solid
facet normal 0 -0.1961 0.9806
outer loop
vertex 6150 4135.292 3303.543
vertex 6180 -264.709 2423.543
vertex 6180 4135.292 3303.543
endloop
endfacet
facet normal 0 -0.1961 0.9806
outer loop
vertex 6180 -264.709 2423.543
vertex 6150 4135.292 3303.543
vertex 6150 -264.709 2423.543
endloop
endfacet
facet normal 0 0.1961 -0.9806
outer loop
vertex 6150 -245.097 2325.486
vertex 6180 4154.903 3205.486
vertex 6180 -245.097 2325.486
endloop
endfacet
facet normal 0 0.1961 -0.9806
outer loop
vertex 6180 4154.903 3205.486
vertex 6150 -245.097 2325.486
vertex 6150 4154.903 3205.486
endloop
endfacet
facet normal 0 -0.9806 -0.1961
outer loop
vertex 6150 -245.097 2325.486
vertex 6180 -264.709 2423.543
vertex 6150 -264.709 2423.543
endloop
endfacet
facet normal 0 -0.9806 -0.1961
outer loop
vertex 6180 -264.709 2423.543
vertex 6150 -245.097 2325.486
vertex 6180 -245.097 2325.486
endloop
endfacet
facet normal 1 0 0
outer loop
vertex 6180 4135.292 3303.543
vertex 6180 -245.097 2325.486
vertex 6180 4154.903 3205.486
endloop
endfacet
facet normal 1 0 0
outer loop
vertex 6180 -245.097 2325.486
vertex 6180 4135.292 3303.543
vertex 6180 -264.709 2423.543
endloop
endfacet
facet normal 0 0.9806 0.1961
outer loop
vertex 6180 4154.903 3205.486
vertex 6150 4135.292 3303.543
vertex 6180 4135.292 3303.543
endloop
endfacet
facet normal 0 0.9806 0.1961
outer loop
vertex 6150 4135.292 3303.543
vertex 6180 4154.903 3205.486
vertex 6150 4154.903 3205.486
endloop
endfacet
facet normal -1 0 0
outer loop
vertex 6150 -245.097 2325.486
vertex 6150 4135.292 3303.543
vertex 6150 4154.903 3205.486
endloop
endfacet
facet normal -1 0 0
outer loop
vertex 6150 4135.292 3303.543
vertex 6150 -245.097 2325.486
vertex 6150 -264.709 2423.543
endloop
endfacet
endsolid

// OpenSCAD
// file: tea_shop_roof_parameters.scad
// =============================================================================
// Tea Shop — GROUP 2: ROOF PARAMETERS
// -----------------------------------------------------------------------------
// OpenSCAD native unit: 1 mm (1000 mm = 1.0 m). Real-life scale.
// Reuses Group 1 (Base & Shell) dimensions and shared global coordinate system:
//   +X -> left -> right  (building width along X, left wall at X = 0)
//   +Y -> front -> back  (building depth along Y, front eave at Y = 0)
//   +Z -> up             (ground / plinth datum = Z = 0)
// =============================================================================

// --- SHARED GLOBAL VARIABLES FROM GROUP 1 (identical values) -----------------
WALL_T             = 250;   // wall panel thickness                      (0.25 m)
BUILD_W            = 6000;  // building width along X, left -> right      (6.00 m)
BUILD_D            = 4000;  // building depth along Y, front eave -> back (4.00 m)
BACK_H             = 3200;  // full wall height at the BACK (tall side)   (3.20 m)
FRONT_H            = 2400;  // wall height at the FRONT eave (short side) (2.40 m)

// Aliases matching Group 1's tea_shop_parameters.scad naming convention
wall_thickness     = WALL_T;
building_width     = BUILD_W;
building_depth     = BUILD_D;
back_height        = BACK_H;
front_eave_height  = FRONT_H;

// --- GROUP 2: ROOF SLAB & OVERHANG PARAMETERS --------------------------------
ROOF_THICKNESS      = 50;   // structural substrate slab thickness       (0.05 m)
ROOF_OVERHANG_LEFT  = 150;  // overhang beyond outer face of left wall    (0.15 m)
ROOF_OVERHANG_RIGHT = 150;  // overhang beyond outer face of right wall   (0.15 m)
ROOF_OVERHANG_BACK  = 150;  // overhang beyond outer face of back wall    (0.15 m)
ROOF_OVERHANG_FRONT = 250;  // overhang forward past front eave wall      (0.25 m)
                            // (Estimated: in reference images, the tiled roof
                            //  terminates ~250mm past the front wall where the
                            //  pergola rafters tie in. Tune here if desired.)

// --- FASCIA / BARGEBOARD TRIM PARAMETERS ------------------------------------
FASCIA_THICKNESS    = 30;   // board thickness (along X for sides, Y for front)
FASCIA_WIDTH        = 100;  // board face height (normal to roof plane)

// --- TOP RIDGE CAPPING STRIP PARAMETERS -------------------------------------
// (Raised capping strip running along the highest back edge where roof meets
//  back wall, visible in wireframe and clay renders to seal top tile ends)
RIDGE_CAP_WIDTH     = 100;  // width / run of capping strip along slope   (0.10 m)
RIDGE_CAP_HEIGHT    = 35;   // raised bump height of capping strip        (0.035 m)

// --- TERRACOTTA ROOF TILE GEOMETRY PARAMETERS -------------------------------
// Shallow repeating barrel / curved ridges running down the slope direction
TILE_PITCH          = 175;  // center-to-center spacing along X between tile crests
TILE_WIDTH          = 120;  // width of each individual curved tile crest
TILE_HEIGHT         = 25;   // raised crest height of tile bump above slab
TILE_FN             = 16;   // polygon facets for lightweight STL export

// =============================================================================
// MATHEMATICAL SLOPE DERIVATION (Trig / Geometry)
// -----------------------------------------------------------------------------
// The monopitch lean-to roof connects the top of the short front wall (Z=FRONT_H
// at Y=0) to the top of the tall back wall (Z=BACK_H at Y=BUILD_D).
//
//   Vertical Rise : ROOF_RISE  = BACK_H - FRONT_H = 3200 - 2400 = 800 mm
//   Horizontal Run: ROOF_RUN   = BUILD_D = 4000 mm
//   Slope Tangent : tan(theta) = Rise / Run = 800 / 4000 = 0.20
//   Slope Angle   : ROOF_ANGLE = atan(0.20) ≈ 11.30993°
//
// Using the exact trigonometric angle prevents any height drift between the
// walls and the roof.
// =============================================================================
ROOF_RISE           = BACK_H - FRONT_H;
ROOF_RUN            = BUILD_D;
ROOF_ANGLE          = atan(ROOF_RISE / ROOF_RUN);

// Total projected extents:
ROOF_WIDTH          = BUILD_W + ROOF_OVERHANG_LEFT + ROOF_OVERHANG_RIGHT;
ROOF_DEPTH_PROJ     = BUILD_D + ROOF_OVERHANG_FRONT + ROOF_OVERHANG_BACK;

// True length along the sloped roof plane (hypotenuse of total run and rise):
ROOF_SLOPE_LEN      = ROOF_DEPTH_PROJ / cos(ROOF_ANGLE);

// Reference coordinate for the sloped roof frame:
// Origin at the lowest front-left corner of the sloped roof slab bottom face
ROOF_ORIGIN_X       = -ROOF_OVERHANG_LEFT;
ROOF_ORIGIN_Y       = -ROOF_OVERHANG_FRONT;
ROOF_ORIGIN_Z       = FRONT_H - ROOF_OVERHANG_FRONT * tan(ROOF_ANGLE);
// file: tea_shop_roof_modules.scad
// =============================================================================
// Tea Shop — GROUP 2: ROOF MODULE LIBRARY
// -----------------------------------------------------------------------------
// This file DEFINES all roof parts (and visual assemble() preview).
// It creates NO geometry on its own when included, allowing individual
// export parts (part_*.scad) and the assembly file to include it cleanly.
//
// SHARED GLOBAL COORDINATE SYSTEM:
//   +X -> left -> right  (0 = left wall outer face, BUILD_W = right wall)
//   +Y -> front -> back  (0 = front eave wall face, BUILD_D = back wall)
//   +Z -> up             (0 = plinth / porch floor datum)
//
// All parts are positioned in place so exported STLs align without manual transforms.
//
// TODO: The wooden pergola structure (posts, crossbeams, longitudinal purlins,
//       flat roof slats, and signboard brackets) is a separate upcoming group
//       and will attach along the front eave edge (Y = -ROOF_OVERHANG_FRONT to 0)
//       extending forward over the porch slab (-base_front_margin .. 0).
// =============================================================================

include <tea_shop_roof_parameters.scad>;

// -----------------------------------------------------------------------------
// _roof_transform — internal transformation helper.
// Translates to the lowest front-left corner of the roof slab bottom face
// (X = -ROOF_OVERHANG_LEFT, Y = -ROOF_OVERHANG_FRONT, Z = ROOF_ORIGIN_Z)
// and rotates around the X-axis by ROOF_ANGLE (pitch angle).
//
// In the child coordinate system:
//   local X : across roof width [0 .. ROOF_WIDTH]
//   local Y : along roof slope UP from front eave to back [0 .. ROOF_SLOPE_LEN]
//   local Z : normal (perpendicular) to the roof plane, pointing up [0 .. thickness]
// -----------------------------------------------------------------------------
module _roof_transform() {
    translate([ROOF_ORIGIN_X, ROOF_ORIGIN_Y, ROOF_ORIGIN_Z])
        rotate([ROOF_ANGLE, 0, 0])
            children();
}


// =============================================================================
// 1. roof_slab — the structural roof substrate.
// A flat slanted slab resting directly on top of the front, back, and side walls.
// Overhangs the building on left, right, and back, and projects forward past
// the front eave to shelter the front wall and meet the pergola frame.
// =============================================================================
module roof_slab() {
    _roof_transform()
        cube([ROOF_WIDTH, ROOF_SLOPE_LEN, ROOF_THICKNESS]);
}


// =============================================================================
// 2. ridge_cap_or_top_trim — raised cap strip along the high back edge.
// As confirmed in the wireframe (countryside-tea-shop-3d-model-9cc7378ff7.webp)
// and clay render (countryside-tea-shop-3d-model-4b97af2b49.webp), this is a
// raised half-round/chamfered capping strip running along the very top edge of
// the roof where it meets the tall back wall, sealing the tile ends against weather.
// =============================================================================
module _ridge_cap_profile_2d() {
    polygon(points = [
        [-RIDGE_CAP_WIDTH/2, 0],
        [-RIDGE_CAP_WIDTH*0.4, RIDGE_CAP_HEIGHT*0.7],
        [-RIDGE_CAP_WIDTH*0.2, RIDGE_CAP_HEIGHT*0.95],
        [ 0,                   RIDGE_CAP_HEIGHT],
        [ RIDGE_CAP_WIDTH*0.2, RIDGE_CAP_HEIGHT*0.95],
        [ RIDGE_CAP_WIDTH*0.4, RIDGE_CAP_HEIGHT*0.7],
        [ RIDGE_CAP_WIDTH/2, 0]
    ]);
}

module ridge_cap_or_top_trim() {
    _roof_transform() {
        translate([-FASCIA_THICKNESS, ROOF_SLOPE_LEN - RIDGE_CAP_WIDTH/2, ROOF_THICKNESS + TILE_HEIGHT])
            rotate([0, 90, 0])
                linear_extrude(height = ROOF_WIDTH + 2 * FASCIA_THICKNESS)
                    _ridge_cap_profile_2d();
    }
}


// =============================================================================
// 3. eave_fascia_left and eave_fascia_right — wooden trim boards running along
// the left and right sloped edges (rakes/verges) of the roof slab.
// Visible in textured renders as the dark timber strips along the outer roof edges.
// Covers both the slab edge and tile profile, extending slightly below the slab.
// =============================================================================
module eave_fascia_left() {
    _roof_transform() {
        translate([-FASCIA_THICKNESS, 0, -(FASCIA_WIDTH - ROOF_THICKNESS)/2])
            cube([FASCIA_THICKNESS, ROOF_SLOPE_LEN, FASCIA_WIDTH]);
    }
}

module eave_fascia_right() {
    _roof_transform() {
        translate([ROOF_WIDTH, 0, -(FASCIA_WIDTH - ROOF_THICKNESS)/2])
            cube([FASCIA_THICKNESS, ROOF_SLOPE_LEN, FASCIA_WIDTH]);
    }
}


// =============================================================================
// 4. eave_fascia_front — horizontal trim board running across the low front
// eave of the roof slab, immediately above where the pergola structure connects.
// =============================================================================
module eave_fascia_front() {
    _roof_transform() {
        translate([-FASCIA_THICKNESS, -FASCIA_THICKNESS, -(FASCIA_WIDTH - ROOF_THICKNESS)/2])
            cube([ROOF_WIDTH + 2 * FASCIA_THICKNESS, FASCIA_THICKNESS, FASCIA_WIDTH]);
    }
}


// =============================================================================
// 5. roof_tile_pattern — shallow repeating bump/ridge pattern on the top face
// of roof_slab(), representing the terracotta barrel tiles visible in the renders.
// Modeled as real geometry using lightweight 2D extruded curved crests running
// down the slope direction (local Y) and repeated along local X with a for loop.
// Parametric spacing (TILE_PITCH) and bump size (TILE_WIDTH, TILE_HEIGHT) allow
// tuning print resolution and file size.
// =============================================================================
module _tile_crest_2d() {
    polygon(points = [
        [-TILE_WIDTH * 0.50, 0],
        [-TILE_WIDTH * 0.42, TILE_HEIGHT * 0.50],
        [-TILE_WIDTH * 0.28, TILE_HEIGHT * 0.85],
        [0,                  TILE_HEIGHT],
        [ TILE_WIDTH * 0.28, TILE_HEIGHT * 0.85],
        [ TILE_WIDTH * 0.42, TILE_HEIGHT * 0.50],
        [ TILE_WIDTH * 0.50, 0]
    ]);
}

module roof_tile_pattern() {
    _roof_transform() {
        rotate([90, 0, 0])
        translate([0, ROOF_THICKNESS, -ROOF_SLOPE_LEN])
        linear_extrude(height = ROOF_SLOPE_LEN) {
            for (x = [TILE_PITCH/2 : TILE_PITCH : ROOF_WIDTH - TILE_PITCH/2]) {
                translate([x, 0, 0])
                    _tile_crest_2d();
            }
        }
    }
}


// =============================================================================
// assemble — visual verification assembly for Group 2 pieces (not for export).
// Displays each module in a distinct contrasting color.
// =============================================================================
module assemble() {
    color("Tan")          roof_slab();
    color("Chocolate")    roof_tile_pattern();
    color("DarkRed")      ridge_cap_or_top_trim();
    color("SaddleBrown")  eave_fascia_left();
    color("SaddleBrown")  eave_fascia_right();
    color("SaddleBrown")  eave_fascia_front();
}
// main file
// =============================================================================
// part_eave_fascia_right.scad — export the RIGHT SLOPED EAVE FASCIA BOARD only.
// Press F6 (render), then export as STL.
// =============================================================================

include <tea_shop_roof_modules.scad>;

eave_fascia_right();
